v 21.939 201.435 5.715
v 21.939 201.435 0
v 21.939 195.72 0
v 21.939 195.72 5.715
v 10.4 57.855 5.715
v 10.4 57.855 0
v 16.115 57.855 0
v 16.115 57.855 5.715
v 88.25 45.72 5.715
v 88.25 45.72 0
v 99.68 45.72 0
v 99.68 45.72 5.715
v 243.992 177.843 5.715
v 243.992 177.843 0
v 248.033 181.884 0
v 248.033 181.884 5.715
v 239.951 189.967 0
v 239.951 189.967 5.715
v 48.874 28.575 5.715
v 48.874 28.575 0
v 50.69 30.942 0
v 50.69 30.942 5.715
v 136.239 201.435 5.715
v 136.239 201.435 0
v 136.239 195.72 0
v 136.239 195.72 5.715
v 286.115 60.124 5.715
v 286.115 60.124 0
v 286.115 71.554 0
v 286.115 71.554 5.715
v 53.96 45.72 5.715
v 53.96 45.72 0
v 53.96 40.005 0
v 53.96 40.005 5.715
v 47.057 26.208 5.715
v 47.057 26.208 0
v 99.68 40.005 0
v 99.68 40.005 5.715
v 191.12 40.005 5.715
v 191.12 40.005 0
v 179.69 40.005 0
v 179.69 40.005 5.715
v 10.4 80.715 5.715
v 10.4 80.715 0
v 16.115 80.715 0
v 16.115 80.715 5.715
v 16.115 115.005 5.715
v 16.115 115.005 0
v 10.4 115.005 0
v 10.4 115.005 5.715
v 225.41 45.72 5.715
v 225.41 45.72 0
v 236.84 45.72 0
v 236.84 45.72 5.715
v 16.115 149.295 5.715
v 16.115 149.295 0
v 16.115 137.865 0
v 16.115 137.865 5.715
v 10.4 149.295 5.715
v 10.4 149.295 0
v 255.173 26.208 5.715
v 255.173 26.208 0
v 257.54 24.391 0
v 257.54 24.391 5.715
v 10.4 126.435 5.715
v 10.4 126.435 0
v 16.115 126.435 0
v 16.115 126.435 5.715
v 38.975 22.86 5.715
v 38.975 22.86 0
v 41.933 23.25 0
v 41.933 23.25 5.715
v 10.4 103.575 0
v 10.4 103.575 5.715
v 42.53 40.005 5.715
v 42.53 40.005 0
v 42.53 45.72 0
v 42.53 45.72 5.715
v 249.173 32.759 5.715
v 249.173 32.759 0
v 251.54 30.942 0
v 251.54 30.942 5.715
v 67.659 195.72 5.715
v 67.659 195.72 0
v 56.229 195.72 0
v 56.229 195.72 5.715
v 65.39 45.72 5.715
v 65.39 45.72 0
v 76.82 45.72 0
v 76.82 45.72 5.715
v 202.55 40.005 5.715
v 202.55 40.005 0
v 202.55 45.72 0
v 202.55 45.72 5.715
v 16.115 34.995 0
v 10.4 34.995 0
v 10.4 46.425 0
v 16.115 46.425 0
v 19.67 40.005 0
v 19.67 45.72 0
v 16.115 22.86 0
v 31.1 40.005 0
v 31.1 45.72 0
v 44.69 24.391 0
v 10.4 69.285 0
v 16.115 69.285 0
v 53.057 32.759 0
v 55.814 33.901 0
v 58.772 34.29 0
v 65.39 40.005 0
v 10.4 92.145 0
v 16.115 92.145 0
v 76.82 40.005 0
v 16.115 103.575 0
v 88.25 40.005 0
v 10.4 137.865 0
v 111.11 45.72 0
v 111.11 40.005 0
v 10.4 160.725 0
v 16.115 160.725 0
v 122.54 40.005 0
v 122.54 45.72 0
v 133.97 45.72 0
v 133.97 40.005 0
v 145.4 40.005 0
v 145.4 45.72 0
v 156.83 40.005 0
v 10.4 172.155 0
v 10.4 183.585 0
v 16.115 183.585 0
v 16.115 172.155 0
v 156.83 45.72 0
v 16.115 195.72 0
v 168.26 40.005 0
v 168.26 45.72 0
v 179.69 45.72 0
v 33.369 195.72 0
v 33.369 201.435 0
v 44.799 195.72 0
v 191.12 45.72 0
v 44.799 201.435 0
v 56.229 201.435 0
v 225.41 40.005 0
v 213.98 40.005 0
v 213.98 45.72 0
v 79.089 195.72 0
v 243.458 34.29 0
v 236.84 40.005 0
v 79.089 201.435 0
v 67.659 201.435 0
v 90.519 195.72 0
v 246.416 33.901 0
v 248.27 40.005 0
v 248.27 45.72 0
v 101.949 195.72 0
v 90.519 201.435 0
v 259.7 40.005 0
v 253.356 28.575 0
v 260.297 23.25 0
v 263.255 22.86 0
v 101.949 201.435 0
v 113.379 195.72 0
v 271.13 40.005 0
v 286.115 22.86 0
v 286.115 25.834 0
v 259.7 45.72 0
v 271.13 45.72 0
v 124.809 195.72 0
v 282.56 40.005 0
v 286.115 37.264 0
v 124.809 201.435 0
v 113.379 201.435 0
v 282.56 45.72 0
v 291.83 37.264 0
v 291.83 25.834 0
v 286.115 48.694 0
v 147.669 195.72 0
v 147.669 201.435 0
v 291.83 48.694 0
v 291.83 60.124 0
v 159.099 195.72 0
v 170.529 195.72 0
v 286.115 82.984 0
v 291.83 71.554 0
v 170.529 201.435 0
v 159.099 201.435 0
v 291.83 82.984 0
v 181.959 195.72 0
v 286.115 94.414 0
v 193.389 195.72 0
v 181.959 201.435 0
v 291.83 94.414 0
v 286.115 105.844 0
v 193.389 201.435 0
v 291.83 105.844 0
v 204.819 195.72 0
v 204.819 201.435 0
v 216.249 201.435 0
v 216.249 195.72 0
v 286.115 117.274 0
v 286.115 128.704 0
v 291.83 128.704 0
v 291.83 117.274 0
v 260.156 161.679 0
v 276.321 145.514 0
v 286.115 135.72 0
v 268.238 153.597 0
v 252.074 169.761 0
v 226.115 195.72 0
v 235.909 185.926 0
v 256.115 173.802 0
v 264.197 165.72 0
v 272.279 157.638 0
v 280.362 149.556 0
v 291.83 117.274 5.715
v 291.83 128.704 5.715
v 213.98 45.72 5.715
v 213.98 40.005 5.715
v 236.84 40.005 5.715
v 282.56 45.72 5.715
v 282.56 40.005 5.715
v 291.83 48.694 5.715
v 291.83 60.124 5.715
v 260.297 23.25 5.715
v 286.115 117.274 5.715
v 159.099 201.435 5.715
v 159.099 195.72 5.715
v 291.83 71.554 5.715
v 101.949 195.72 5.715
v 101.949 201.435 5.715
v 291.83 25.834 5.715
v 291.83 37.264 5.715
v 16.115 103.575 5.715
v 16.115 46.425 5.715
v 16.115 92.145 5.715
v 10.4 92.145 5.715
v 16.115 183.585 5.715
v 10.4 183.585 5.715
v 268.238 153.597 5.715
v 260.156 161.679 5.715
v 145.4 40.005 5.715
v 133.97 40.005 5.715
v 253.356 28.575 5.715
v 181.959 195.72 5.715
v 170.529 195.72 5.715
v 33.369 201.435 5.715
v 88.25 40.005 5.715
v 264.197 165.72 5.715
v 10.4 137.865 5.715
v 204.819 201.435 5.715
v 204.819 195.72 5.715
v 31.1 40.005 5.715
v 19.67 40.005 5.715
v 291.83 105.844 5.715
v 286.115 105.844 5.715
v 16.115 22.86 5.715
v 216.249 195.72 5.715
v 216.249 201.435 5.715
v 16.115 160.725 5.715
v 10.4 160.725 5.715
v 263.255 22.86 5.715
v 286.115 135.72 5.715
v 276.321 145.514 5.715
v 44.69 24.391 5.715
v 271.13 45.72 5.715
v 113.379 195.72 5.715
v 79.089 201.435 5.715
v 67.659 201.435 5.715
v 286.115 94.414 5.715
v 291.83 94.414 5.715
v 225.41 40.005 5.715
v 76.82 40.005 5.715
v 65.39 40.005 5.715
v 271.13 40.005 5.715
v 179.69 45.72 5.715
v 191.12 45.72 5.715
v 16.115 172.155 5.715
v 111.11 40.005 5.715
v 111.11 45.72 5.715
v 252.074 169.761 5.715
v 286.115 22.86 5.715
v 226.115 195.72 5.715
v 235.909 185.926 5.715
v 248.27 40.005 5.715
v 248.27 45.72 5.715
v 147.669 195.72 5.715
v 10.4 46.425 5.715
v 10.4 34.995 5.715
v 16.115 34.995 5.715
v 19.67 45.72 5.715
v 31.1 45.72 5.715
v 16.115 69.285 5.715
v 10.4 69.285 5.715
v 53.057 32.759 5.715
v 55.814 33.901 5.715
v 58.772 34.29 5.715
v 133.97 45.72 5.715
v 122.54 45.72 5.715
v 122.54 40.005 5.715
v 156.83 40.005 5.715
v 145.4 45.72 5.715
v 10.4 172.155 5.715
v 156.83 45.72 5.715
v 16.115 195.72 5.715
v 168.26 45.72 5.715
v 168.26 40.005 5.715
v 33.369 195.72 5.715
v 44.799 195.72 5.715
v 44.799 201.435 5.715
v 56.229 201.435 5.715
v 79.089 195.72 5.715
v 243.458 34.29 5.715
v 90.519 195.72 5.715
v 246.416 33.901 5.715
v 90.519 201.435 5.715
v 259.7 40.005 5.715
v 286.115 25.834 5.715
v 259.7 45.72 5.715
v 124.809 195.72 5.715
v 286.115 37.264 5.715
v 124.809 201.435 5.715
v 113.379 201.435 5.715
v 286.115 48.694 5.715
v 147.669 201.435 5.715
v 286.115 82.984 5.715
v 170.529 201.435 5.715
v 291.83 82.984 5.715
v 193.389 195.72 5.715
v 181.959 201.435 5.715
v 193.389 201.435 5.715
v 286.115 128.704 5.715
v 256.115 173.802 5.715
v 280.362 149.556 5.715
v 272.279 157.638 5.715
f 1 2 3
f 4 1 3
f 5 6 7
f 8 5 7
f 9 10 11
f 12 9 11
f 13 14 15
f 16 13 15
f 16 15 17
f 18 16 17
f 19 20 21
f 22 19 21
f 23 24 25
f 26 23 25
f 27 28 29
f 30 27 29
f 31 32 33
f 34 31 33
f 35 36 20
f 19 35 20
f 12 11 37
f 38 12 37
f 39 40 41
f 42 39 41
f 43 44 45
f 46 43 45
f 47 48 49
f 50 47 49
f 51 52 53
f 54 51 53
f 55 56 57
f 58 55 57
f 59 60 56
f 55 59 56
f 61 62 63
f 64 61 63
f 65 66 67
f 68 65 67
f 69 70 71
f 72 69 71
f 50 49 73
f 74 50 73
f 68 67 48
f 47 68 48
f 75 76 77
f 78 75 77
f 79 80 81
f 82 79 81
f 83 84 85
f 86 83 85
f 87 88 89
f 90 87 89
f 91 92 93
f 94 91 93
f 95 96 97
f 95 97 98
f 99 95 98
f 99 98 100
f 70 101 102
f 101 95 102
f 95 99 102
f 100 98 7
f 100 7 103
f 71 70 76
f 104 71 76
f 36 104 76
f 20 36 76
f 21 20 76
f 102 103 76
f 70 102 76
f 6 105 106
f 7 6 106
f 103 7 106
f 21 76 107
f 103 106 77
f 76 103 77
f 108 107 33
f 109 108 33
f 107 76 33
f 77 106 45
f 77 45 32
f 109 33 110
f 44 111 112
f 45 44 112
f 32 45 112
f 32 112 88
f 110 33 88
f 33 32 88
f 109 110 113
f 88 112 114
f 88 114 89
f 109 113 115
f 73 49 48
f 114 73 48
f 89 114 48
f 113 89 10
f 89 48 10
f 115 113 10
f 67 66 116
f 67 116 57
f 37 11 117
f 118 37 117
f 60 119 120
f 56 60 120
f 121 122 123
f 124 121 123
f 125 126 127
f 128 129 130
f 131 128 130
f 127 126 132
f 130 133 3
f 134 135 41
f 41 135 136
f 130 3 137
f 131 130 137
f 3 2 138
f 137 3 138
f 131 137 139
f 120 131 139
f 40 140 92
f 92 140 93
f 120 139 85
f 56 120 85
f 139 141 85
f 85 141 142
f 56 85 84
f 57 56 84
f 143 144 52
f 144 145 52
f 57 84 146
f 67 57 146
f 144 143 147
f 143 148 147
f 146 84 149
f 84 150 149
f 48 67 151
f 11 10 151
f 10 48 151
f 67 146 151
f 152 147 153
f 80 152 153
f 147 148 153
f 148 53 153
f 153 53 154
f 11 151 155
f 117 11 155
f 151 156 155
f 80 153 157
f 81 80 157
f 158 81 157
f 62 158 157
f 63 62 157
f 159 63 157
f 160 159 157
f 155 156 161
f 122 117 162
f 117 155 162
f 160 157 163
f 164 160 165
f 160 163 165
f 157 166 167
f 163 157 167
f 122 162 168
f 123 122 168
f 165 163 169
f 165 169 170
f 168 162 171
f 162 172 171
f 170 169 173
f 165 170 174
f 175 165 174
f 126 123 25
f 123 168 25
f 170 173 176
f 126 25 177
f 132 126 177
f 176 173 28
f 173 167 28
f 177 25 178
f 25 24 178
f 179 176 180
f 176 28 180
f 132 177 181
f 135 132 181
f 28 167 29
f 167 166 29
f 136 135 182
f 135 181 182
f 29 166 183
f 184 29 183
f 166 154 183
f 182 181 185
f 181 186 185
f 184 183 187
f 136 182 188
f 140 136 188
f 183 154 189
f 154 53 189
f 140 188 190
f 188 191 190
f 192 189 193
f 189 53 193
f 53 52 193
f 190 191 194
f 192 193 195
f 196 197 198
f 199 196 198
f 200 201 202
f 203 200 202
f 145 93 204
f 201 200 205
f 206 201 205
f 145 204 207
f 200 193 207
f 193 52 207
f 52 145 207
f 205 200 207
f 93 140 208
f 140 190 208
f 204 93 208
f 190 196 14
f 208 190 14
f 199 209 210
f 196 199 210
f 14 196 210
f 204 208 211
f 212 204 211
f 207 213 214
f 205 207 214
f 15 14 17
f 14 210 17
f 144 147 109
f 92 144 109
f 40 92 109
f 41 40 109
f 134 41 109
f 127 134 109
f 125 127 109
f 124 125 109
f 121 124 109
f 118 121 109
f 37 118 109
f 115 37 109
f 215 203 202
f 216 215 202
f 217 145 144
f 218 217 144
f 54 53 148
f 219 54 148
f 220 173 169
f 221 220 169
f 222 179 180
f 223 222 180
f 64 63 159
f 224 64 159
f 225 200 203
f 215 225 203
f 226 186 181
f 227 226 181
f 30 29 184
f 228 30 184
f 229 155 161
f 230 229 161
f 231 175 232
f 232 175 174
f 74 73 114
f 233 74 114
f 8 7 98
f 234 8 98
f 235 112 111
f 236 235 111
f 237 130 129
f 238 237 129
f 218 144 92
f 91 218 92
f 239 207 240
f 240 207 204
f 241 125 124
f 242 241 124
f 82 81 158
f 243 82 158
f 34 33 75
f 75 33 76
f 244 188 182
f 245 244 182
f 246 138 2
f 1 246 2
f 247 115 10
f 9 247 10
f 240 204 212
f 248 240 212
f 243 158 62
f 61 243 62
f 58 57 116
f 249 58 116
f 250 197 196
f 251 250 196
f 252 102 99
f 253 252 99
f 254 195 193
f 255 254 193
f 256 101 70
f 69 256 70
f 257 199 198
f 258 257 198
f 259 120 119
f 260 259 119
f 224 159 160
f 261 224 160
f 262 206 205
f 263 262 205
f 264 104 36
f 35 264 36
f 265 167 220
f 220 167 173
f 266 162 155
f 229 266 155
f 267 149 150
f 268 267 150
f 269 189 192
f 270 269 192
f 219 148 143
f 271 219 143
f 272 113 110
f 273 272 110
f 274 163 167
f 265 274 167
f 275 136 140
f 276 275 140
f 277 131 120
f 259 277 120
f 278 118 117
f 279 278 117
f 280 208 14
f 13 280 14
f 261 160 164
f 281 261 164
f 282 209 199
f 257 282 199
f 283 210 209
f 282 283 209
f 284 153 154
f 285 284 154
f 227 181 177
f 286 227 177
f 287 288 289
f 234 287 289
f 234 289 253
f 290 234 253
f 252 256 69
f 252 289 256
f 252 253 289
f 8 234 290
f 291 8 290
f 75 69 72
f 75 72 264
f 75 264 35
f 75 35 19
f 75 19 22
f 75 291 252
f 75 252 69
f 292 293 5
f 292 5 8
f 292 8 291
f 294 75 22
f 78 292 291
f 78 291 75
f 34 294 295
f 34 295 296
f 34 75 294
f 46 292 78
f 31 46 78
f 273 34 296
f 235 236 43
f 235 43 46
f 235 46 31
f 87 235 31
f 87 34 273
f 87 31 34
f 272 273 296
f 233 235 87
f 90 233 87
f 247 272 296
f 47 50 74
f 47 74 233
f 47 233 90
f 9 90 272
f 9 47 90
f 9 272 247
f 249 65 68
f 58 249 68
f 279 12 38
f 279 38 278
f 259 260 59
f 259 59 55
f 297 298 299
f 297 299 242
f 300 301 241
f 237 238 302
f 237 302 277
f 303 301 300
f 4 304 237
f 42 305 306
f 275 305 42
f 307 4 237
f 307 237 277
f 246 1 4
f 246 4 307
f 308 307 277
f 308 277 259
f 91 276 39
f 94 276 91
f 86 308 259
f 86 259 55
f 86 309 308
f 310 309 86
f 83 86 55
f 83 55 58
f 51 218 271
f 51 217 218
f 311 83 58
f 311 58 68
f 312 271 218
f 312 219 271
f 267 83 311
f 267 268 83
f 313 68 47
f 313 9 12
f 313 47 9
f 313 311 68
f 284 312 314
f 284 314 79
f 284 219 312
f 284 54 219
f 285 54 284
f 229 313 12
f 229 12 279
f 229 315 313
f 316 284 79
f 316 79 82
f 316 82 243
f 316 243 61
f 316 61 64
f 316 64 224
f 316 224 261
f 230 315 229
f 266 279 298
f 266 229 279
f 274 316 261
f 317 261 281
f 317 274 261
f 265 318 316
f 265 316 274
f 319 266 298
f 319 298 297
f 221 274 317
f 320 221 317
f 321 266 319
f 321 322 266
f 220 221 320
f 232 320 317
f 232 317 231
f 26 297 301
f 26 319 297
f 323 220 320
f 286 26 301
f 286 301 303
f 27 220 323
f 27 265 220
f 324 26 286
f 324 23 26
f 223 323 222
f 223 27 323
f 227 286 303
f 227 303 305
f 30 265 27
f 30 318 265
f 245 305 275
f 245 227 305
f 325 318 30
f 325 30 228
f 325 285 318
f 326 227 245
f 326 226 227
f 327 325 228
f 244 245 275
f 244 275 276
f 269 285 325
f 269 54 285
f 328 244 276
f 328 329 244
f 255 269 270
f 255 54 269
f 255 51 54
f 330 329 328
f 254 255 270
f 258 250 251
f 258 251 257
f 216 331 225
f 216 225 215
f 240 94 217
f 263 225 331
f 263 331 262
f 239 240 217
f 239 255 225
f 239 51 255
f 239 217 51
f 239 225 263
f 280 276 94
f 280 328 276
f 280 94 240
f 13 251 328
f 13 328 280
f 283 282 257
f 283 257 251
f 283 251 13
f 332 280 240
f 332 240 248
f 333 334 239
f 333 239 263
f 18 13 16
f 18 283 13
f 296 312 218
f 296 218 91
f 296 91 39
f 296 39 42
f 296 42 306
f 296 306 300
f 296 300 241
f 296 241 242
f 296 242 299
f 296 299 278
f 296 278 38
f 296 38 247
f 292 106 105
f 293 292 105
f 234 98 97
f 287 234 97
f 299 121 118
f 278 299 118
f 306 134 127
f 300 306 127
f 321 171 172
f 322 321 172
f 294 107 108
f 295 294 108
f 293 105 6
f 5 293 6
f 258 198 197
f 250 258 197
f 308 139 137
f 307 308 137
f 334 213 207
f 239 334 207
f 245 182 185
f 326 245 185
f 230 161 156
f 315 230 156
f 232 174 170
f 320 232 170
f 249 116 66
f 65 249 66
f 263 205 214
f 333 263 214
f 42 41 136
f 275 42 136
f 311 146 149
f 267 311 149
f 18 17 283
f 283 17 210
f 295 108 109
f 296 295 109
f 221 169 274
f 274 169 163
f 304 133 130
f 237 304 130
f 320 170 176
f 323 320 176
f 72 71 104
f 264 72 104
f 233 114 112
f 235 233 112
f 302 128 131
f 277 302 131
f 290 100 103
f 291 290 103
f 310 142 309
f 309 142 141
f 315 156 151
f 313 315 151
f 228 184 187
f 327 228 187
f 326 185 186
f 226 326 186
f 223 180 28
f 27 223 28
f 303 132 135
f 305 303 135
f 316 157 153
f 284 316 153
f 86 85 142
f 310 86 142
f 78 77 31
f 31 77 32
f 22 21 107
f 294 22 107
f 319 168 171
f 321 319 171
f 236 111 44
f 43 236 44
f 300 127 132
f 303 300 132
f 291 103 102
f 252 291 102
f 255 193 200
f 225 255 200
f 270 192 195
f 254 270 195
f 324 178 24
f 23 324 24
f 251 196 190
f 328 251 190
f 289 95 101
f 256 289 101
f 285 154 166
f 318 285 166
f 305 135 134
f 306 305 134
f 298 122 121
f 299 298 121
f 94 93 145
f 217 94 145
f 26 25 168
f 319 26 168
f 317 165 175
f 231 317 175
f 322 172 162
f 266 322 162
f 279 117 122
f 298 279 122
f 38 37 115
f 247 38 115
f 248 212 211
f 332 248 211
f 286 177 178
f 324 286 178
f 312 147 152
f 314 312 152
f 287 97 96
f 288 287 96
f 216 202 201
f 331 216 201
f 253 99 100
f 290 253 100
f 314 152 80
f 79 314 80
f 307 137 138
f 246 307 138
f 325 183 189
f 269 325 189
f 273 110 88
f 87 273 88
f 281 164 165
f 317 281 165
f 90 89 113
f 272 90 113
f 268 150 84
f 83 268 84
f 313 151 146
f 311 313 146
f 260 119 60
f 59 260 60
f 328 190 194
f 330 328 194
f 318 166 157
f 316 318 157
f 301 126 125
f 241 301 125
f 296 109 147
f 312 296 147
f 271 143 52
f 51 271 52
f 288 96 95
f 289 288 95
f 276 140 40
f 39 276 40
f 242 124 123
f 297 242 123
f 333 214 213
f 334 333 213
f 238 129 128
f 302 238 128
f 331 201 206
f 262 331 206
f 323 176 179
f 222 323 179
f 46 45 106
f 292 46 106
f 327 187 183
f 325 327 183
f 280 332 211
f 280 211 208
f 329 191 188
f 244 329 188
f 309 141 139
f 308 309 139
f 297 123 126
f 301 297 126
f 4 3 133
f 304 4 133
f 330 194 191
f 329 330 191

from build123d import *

# Parameters (mm, degrees)
BOSS_EXTRUDE1_DEPTH = 5.715


with BuildPart() as part:
    # Model → Boss-Extrude1 (new body)
    with BuildSketch(Plane.XY):
        Polygon((16.115014462, 22.860238699), (38.975005129, 22.860238699), (41.932961262, 23.249623789), (44.690011654, 24.391232573), (47.057297821, 26.208001576), (48.873953439, 28.575245224), (50.690254725, 30.942499501), (53.057186561, 32.759257875), (55.814102307, 33.900880832), (58.772193086, 34.290251749), (243.45807324, 34.290251749), (246.416029373, 33.900880832), (249.173079765, 32.759257875), (251.539834435, 30.942499501), (253.355958556, 28.575245224), (255.172925985, 26.208001576), (257.540254672, 24.391232573), (260.297170418, 23.249623789), (263.255261197, 22.860238699), (286.114932966, 22.860238699), (286.114932966, 25.834246031), (291.829939491, 25.834246031), (291.829939491, 37.264294514), (286.114932966, 37.264294514), (286.114932966, 48.694307564), (291.829939491, 48.694307564), (291.829939491, 60.124320614), (286.114932966, 60.124320614), (286.114932966, 71.554333664), (291.829939491, 71.554333664), (291.829939491, 82.984346714), (286.114932966, 82.984346714), (286.114932966, 94.414359764), (291.829939491, 94.414359764), (291.829939491, 105.844372814), (286.114932966, 105.844372814), (286.114932966, 117.274385864), (291.829939491, 117.274385864), (291.829939491, 128.704398914), (286.114932966, 128.704398914), (286.114932966, 131.679362941), (286.114932966, 135.720154956), (276.321220997, 145.514221256), (280.362013012, 149.556430596), (272.279011657, 157.638368957), (268.238219642, 153.597222611), (260.15592695, 161.679160972), (264.197073296, 165.720307318), (256.115134935, 173.80224568), (252.073988588, 169.761453665), (243.992050227, 177.843392026), (248.033196573, 181.884184041), (239.951258212, 189.967185396), (235.909048873, 185.926393381), (226.114982572, 195.720459681), (222.074190557, 195.720459681), (216.248987056, 195.720459681), (216.248987056, 201.435466206), (204.818974006, 201.435466206), (204.818974006, 195.720459681), (193.388960956, 195.720459681), (193.388960956, 201.435466206), (181.958947906, 201.435466206), (181.958947906, 195.720459681), (170.528934856, 195.720459681), (170.528934856, 201.435466206), (159.098921806, 201.435466206), (159.098921806, 195.720459681), (147.668908756, 195.720459681), (147.668908756, 201.435466206), (136.238895706, 201.435466206), (136.238895706, 195.720459681), (124.808882656, 195.720459681), (124.808882656, 201.435466206), (113.378869606, 201.435466206), (113.378869606, 195.720459681), (101.949210887, 195.720459681), (101.949210887, 201.435466206), (90.519197837, 201.435466206), (90.519197837, 195.720459681), (79.089184787, 195.720459681), (79.089184787, 201.435466206), (67.659171737, 201.435466206), (67.659171737, 195.720459681), (56.229158687, 195.720459681), (56.229158687, 201.435466206), (44.799145637, 201.435466206), (44.799145637, 195.720459681), (33.369026287, 195.720459681), (33.369026287, 201.435466206), (21.939013237, 201.435466206), (21.939013237, 195.720459681), (16.115014462, 195.720459681), (16.115014462, 183.585327716), (10.400007937, 183.585327716), (10.400007937, 172.155314666), (16.115014462, 172.155314666), (16.115014462, 160.725301616), (10.400007937, 160.725301616), (10.400007937, 149.295288565), (16.115014462, 149.295288565), (16.115014462, 137.865275515), (10.400007937, 137.865275515), (10.400007937, 126.435262465), (16.115014462, 126.435262465), (16.115014462, 115.005249415), (10.400007937, 115.005249415), (10.400007937, 103.575236365), (16.115014462, 103.575236365), (16.115014462, 92.145223315), (10.400007937, 92.145223315), (10.400007937, 80.715210265), (16.115014462, 80.715210265), (16.115014462, 69.285197215), (10.400007937, 69.285197215), (10.400007937, 57.855184165), (16.115014462, 57.855184165), (16.115014462, 46.425171115), (10.400007937, 46.425171115), (10.400007937, 34.995264365), (16.115014462, 34.995264365), align=None)
        Polygon((25.385025046, 40.005400006), (19.670018521, 40.005400006), (19.670018521, 45.720406531), (31.099996138, 45.720406531), (31.099996138, 40.005400006), align=None, mode=Mode.SUBTRACT)
        Polygon((48.245015713, 40.005400006), (42.530009188, 40.005400006), (42.530009188, 45.720406531), (53.960022238, 45.720406531), (53.960022238, 40.005400006), align=None, mode=Mode.SUBTRACT)
        Polygon((71.105041813, 40.005400006), (65.390035288, 40.005400006), (65.390035288, 45.720406531), (76.820048338, 45.720406531), (76.820048338, 40.005400006), align=None, mode=Mode.SUBTRACT)
        Polygon((93.965067913, 40.005400006), (88.250061388, 40.005400006), (88.250061388, 45.720406531), (99.680074438, 45.720406531), (99.680074438, 40.005400006), align=None, mode=Mode.SUBTRACT)
        Polygon((116.825094013, 40.005400006), (111.110087488, 40.005400006), (111.110087488, 45.720406531), (122.540100538, 45.720406531), (122.540100538, 40.005400006), align=None, mode=Mode.SUBTRACT)
        Polygon((139.685120113, 40.005400006), (133.970113588, 40.005400006), (133.970113588, 45.720406531), (145.400126638, 45.720406531), (145.400126638, 40.005400006), align=None, mode=Mode.SUBTRACT)
        Polygon((162.545146213, 40.005400006), (156.830139688, 40.005400006), (156.830139688, 45.720406531), (168.260152738, 45.720406531), (168.260152738, 40.005400006), align=None, mode=Mode.SUBTRACT)
        Polygon((185.405172313, 40.005400006), (179.690165788, 40.005400006), (179.690165788, 45.720406531), (191.120178838, 45.720406531), (191.120178838, 40.005400006), align=None, mode=Mode.SUBTRACT)
        Polygon((208.265198413, 40.005400006), (202.550191888, 40.005400006), (202.550191888, 45.720406531), (213.980204938, 45.720406531), (213.980204938, 40.005400006), align=None, mode=Mode.SUBTRACT)
        Polygon((231.125224513, 40.005400006), (225.410217988, 40.005400006), (225.410217988, 45.720406531), (236.840231038, 45.720406531), (236.840231038, 40.005400006), align=None, mode=Mode.SUBTRACT)
        Polygon((253.985250613, 40.005400006), (248.270244088, 40.005400006), (248.270244088, 45.720406531), (259.700257138, 45.720406531), (259.700257138, 40.005400006), align=None, mode=Mode.SUBTRACT)
        Polygon((276.844922382, 40.005400006), (271.130270188, 40.005400006), (271.130270188, 45.720406531), (282.559928907, 45.720406531), (282.559928907, 40.005400006), align=None, mode=Mode.SUBTRACT)
    extrude(amount=BOSS_EXTRUDE1_DEPTH)


solid = part.part
